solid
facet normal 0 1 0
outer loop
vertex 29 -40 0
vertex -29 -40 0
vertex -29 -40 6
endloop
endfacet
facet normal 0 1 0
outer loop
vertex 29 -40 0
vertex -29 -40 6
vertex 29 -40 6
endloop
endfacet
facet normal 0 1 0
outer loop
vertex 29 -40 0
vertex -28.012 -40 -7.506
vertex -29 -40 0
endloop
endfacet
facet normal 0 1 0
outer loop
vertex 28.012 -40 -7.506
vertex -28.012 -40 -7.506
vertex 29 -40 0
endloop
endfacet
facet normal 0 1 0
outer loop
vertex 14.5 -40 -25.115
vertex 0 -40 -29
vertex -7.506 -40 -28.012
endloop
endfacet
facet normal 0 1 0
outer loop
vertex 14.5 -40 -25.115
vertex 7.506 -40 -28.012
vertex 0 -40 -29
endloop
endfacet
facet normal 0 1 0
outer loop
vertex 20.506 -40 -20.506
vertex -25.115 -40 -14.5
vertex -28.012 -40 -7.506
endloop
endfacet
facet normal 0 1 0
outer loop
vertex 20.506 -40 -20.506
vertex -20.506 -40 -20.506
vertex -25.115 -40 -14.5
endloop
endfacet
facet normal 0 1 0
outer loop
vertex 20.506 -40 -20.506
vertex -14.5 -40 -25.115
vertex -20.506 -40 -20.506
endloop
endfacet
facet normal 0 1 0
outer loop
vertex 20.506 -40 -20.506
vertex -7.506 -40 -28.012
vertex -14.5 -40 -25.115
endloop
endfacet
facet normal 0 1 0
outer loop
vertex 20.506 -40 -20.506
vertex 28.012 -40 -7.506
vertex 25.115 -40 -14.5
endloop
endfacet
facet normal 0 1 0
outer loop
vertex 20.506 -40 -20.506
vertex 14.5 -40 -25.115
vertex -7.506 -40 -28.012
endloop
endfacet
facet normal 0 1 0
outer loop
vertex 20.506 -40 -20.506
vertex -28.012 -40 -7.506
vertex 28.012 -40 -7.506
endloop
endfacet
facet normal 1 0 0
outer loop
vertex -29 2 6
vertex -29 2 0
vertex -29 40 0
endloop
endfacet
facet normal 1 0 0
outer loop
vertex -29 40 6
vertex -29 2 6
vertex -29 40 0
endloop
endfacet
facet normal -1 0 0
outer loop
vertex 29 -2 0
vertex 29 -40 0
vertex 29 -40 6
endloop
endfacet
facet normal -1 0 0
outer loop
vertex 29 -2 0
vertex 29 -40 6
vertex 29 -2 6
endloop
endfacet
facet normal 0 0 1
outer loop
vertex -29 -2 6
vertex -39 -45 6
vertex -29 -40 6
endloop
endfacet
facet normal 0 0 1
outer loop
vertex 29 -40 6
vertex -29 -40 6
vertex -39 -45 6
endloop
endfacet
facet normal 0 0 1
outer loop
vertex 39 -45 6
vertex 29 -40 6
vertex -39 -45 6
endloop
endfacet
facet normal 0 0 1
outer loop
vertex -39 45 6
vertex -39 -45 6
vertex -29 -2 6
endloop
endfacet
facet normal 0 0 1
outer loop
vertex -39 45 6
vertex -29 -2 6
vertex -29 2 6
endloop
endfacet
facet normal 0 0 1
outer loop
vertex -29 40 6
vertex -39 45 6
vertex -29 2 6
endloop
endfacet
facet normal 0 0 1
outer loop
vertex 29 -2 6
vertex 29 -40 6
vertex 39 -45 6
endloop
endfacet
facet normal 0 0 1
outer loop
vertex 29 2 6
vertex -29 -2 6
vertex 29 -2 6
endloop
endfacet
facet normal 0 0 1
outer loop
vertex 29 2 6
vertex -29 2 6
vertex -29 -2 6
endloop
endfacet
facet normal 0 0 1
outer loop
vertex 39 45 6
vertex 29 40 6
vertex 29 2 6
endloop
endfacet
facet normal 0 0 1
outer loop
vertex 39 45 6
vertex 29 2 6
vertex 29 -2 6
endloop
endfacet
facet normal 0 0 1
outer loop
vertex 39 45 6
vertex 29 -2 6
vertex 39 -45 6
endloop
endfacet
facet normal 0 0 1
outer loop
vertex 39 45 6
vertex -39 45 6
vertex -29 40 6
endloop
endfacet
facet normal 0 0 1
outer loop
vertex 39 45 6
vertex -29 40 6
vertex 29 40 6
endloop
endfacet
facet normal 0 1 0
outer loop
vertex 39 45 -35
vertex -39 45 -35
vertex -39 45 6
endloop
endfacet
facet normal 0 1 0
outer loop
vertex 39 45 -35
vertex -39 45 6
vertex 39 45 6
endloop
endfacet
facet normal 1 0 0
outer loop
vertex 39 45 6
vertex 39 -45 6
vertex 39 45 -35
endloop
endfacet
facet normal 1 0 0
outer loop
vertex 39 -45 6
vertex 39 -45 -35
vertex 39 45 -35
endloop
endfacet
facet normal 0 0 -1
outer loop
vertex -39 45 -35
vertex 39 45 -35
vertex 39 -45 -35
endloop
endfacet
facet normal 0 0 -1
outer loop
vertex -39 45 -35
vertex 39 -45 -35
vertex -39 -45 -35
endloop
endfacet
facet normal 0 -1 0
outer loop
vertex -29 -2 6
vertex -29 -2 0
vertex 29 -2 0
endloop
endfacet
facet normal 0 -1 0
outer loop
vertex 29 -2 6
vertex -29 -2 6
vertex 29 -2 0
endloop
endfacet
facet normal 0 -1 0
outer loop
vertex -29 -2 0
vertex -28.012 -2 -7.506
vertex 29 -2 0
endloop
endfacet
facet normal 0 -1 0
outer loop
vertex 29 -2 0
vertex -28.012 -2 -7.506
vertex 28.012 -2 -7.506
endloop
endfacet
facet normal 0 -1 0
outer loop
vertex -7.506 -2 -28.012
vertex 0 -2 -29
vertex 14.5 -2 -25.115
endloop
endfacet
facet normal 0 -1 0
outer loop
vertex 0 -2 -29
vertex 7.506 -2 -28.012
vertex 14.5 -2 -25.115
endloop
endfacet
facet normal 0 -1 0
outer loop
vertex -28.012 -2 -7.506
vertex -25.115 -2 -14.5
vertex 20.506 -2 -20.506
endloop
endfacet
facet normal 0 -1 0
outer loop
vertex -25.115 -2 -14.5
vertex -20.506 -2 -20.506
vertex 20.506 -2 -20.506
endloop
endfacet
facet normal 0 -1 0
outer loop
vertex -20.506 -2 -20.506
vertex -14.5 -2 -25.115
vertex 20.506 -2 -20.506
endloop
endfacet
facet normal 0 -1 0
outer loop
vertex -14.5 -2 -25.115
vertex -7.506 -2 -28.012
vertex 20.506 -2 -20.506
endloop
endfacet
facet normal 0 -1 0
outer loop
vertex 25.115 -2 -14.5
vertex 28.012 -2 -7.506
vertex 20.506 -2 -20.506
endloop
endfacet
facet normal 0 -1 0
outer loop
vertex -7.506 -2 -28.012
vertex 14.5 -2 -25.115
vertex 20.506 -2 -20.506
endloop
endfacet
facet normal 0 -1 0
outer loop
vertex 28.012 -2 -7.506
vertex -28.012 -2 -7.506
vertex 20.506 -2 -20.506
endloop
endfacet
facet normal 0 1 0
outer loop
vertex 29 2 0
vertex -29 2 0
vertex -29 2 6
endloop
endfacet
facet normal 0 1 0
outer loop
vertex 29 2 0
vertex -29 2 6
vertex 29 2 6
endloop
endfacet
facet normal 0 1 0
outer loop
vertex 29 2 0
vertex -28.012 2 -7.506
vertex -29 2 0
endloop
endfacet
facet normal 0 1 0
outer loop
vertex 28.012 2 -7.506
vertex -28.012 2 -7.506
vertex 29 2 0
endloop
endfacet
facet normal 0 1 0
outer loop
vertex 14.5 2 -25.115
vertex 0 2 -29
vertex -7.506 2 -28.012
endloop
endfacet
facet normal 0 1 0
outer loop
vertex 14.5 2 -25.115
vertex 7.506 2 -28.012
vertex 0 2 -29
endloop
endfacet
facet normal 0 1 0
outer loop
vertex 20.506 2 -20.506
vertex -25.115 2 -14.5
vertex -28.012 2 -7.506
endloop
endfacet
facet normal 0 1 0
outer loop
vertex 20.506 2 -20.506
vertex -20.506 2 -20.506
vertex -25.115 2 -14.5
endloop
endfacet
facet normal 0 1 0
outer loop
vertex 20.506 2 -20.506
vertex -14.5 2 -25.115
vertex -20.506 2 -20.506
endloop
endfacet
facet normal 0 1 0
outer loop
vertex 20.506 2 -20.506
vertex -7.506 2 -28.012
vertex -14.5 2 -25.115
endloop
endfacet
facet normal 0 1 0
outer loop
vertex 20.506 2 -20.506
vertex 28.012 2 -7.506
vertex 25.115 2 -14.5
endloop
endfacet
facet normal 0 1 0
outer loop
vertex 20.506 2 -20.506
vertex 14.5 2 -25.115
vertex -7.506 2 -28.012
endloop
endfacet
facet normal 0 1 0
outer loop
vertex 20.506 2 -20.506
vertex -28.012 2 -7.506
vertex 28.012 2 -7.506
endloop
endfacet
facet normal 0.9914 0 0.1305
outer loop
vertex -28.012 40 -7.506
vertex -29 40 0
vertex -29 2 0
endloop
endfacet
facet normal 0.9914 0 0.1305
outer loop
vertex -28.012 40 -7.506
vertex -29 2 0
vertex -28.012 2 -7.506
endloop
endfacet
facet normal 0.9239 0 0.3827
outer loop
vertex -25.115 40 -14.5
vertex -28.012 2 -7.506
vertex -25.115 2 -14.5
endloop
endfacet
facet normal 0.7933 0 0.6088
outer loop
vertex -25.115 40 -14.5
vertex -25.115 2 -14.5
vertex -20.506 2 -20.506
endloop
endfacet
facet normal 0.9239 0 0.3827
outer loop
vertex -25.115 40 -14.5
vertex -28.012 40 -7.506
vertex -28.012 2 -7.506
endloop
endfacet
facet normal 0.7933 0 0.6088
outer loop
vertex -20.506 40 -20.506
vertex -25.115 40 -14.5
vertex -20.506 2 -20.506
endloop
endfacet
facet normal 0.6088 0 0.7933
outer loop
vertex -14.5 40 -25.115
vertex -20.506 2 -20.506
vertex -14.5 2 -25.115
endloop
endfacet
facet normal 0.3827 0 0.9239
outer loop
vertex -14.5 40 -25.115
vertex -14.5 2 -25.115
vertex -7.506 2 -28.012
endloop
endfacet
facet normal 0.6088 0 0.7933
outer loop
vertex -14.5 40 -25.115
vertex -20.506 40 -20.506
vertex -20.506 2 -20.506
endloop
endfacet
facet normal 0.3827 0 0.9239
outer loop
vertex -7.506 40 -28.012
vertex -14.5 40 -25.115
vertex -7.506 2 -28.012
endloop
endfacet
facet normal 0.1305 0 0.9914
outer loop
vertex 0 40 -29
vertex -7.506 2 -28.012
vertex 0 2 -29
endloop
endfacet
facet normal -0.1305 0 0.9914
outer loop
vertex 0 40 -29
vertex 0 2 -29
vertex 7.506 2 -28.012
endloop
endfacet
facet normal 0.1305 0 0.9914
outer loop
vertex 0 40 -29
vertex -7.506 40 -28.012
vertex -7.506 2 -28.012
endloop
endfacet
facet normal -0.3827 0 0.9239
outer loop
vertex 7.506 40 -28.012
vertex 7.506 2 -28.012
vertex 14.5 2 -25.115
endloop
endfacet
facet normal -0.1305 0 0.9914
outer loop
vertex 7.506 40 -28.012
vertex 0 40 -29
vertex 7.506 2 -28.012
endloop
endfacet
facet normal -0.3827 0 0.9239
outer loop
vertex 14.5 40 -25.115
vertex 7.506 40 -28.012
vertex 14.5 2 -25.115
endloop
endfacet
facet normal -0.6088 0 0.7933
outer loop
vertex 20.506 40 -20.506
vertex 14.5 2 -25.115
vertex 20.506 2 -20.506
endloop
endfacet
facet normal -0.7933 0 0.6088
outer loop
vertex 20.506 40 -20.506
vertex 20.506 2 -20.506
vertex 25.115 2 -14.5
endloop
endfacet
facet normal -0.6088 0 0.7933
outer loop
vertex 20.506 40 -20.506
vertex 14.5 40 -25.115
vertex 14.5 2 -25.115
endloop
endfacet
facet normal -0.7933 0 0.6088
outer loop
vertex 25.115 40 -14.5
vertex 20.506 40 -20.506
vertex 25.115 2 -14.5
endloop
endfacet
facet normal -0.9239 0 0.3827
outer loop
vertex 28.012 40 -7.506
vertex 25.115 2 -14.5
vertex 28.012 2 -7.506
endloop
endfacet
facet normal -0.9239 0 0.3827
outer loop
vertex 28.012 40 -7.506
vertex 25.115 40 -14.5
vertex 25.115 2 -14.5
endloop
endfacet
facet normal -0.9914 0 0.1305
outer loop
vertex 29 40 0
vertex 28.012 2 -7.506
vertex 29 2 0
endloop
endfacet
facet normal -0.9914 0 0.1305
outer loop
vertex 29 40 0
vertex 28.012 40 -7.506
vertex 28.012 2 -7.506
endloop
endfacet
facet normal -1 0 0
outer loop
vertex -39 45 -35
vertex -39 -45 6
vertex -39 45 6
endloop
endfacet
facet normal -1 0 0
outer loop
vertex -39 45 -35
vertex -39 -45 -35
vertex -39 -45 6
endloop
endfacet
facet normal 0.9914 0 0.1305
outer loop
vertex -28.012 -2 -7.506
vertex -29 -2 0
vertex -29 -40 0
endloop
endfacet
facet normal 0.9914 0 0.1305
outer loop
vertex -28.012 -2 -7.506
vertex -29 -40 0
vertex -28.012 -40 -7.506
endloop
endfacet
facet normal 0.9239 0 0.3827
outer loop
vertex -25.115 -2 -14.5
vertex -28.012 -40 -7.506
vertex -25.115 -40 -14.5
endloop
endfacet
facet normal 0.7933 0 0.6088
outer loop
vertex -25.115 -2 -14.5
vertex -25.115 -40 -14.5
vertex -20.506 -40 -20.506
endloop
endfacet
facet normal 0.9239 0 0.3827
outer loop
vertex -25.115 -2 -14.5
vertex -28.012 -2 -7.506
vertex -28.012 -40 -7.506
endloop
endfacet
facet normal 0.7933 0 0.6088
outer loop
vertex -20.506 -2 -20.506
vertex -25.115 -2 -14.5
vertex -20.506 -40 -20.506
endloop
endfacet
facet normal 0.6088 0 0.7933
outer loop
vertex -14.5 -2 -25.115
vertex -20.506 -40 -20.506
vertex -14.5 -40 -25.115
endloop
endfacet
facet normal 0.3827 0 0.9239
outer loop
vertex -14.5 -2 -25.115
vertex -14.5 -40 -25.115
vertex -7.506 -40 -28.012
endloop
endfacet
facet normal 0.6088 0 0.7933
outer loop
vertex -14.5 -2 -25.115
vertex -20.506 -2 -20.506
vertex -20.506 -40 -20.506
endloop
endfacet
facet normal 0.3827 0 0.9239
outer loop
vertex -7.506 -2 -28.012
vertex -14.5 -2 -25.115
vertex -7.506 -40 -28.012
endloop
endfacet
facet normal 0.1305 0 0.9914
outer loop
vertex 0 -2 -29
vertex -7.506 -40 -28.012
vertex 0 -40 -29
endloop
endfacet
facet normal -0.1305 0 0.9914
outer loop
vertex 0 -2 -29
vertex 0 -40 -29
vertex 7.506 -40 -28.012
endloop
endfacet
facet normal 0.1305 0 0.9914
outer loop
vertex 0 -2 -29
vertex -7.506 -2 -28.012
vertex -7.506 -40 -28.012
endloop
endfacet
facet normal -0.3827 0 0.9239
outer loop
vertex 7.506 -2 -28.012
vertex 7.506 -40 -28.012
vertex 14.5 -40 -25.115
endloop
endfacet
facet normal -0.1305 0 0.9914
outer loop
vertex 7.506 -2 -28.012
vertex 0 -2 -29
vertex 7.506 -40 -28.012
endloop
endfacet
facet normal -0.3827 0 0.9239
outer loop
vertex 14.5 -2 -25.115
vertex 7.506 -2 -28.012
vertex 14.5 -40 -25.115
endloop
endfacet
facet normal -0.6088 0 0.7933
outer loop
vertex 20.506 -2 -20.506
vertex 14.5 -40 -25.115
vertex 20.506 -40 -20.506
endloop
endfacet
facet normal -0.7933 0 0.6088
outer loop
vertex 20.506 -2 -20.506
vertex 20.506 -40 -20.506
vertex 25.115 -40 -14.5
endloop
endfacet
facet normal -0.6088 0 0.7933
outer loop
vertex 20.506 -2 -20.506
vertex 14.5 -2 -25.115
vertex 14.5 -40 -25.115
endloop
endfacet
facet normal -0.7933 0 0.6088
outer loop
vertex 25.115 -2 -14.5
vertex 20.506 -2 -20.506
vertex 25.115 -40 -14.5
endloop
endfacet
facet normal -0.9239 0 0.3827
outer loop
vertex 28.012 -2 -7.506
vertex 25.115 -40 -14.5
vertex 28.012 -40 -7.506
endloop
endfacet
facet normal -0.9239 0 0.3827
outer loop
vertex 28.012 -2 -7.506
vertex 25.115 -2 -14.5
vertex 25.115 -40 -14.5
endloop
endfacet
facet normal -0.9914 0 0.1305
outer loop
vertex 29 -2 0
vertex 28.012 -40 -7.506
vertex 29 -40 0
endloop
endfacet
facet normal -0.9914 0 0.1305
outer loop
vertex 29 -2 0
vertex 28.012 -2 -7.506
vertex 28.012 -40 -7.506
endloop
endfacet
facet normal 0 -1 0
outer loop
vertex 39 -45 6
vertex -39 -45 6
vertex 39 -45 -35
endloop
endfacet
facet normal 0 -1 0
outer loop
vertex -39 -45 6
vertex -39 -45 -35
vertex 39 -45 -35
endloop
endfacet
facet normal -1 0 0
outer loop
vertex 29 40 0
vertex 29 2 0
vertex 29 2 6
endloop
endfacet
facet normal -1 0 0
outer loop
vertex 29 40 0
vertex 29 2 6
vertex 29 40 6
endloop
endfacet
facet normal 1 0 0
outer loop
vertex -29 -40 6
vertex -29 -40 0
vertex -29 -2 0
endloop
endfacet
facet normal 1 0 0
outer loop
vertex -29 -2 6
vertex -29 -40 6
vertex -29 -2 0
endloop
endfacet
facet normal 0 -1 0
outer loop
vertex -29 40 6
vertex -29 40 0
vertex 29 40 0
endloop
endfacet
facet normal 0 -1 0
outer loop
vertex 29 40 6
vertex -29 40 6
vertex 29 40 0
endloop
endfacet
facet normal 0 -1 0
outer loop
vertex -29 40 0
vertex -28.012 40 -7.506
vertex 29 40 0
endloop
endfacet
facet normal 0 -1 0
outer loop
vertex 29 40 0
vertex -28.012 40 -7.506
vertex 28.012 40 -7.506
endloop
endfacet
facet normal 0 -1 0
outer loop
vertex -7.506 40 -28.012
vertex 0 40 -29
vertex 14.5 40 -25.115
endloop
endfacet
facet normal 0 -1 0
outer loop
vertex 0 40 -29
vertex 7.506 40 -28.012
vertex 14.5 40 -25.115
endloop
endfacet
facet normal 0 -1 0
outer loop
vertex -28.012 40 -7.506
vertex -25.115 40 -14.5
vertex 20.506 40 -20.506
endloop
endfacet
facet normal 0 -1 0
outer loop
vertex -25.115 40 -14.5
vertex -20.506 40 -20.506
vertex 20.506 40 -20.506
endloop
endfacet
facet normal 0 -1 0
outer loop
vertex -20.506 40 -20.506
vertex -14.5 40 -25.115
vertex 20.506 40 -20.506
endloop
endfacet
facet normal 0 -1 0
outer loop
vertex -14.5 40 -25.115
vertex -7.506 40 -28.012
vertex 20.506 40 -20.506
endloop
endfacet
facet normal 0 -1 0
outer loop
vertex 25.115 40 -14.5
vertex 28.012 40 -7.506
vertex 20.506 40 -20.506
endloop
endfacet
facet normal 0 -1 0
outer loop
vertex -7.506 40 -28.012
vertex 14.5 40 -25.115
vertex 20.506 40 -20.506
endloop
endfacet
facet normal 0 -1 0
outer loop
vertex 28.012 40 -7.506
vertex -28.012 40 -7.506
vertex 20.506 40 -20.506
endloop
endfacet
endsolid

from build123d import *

# Parameters (mm, degrees)
BOSS_EXTRUDE1_DEPTH = 45
SKETCH2_W           = 29
SKETCH2_H           = 38
SKETCH3_W           = 78
SKETCH3_H           = 90
SKETCH3_W_2         = 58
SKETCH3_H_2         = 38
BOSS_EXTRUDE2_DEPTH = 6


with BuildPart() as part:
    # Sketch1 → Boss-Extrude1 (new, symmetric)
    with BuildSketch(Plane(origin=(0, 0, 0), x_dir=(-1, 0, 0), z_dir=(0, 1, 0))):
        Polygon((39, 0), (29, 0), (-29, 0), (-39, 0), (-39, -35), (39, -35), align=None)
    extrude(amount=BOSS_EXTRUDE1_DEPTH, both=True)

    # Sketch2 → Cut-Revolve4 (revolve, cut)
    with BuildSketch(Plane.XY):
        with Locations((-14.5, -21)):
            Rectangle(SKETCH2_W, SKETCH2_H)
        with Locations((-14.5, 21)):
            Rectangle(SKETCH2_W, SKETCH2_H)
    revolve(axis=Axis((0, 45, 0), (0, -1, 0)), mode=Mode.SUBTRACT)

    # Sketch3 → Boss-Extrude2 (add)
    with BuildSketch(Plane.XY):
        Rectangle(SKETCH3_W, SKETCH3_H)
        with Locations((0, -21)):
            Rectangle(SKETCH3_W_2, SKETCH3_H_2, mode=Mode.SUBTRACT)
        with Locations((0, 21)):
            Rectangle(SKETCH3_W_2, SKETCH3_H_2, mode=Mode.SUBTRACT)
    extrude(amount=BOSS_EXTRUDE2_DEPTH)


solid = part.part
